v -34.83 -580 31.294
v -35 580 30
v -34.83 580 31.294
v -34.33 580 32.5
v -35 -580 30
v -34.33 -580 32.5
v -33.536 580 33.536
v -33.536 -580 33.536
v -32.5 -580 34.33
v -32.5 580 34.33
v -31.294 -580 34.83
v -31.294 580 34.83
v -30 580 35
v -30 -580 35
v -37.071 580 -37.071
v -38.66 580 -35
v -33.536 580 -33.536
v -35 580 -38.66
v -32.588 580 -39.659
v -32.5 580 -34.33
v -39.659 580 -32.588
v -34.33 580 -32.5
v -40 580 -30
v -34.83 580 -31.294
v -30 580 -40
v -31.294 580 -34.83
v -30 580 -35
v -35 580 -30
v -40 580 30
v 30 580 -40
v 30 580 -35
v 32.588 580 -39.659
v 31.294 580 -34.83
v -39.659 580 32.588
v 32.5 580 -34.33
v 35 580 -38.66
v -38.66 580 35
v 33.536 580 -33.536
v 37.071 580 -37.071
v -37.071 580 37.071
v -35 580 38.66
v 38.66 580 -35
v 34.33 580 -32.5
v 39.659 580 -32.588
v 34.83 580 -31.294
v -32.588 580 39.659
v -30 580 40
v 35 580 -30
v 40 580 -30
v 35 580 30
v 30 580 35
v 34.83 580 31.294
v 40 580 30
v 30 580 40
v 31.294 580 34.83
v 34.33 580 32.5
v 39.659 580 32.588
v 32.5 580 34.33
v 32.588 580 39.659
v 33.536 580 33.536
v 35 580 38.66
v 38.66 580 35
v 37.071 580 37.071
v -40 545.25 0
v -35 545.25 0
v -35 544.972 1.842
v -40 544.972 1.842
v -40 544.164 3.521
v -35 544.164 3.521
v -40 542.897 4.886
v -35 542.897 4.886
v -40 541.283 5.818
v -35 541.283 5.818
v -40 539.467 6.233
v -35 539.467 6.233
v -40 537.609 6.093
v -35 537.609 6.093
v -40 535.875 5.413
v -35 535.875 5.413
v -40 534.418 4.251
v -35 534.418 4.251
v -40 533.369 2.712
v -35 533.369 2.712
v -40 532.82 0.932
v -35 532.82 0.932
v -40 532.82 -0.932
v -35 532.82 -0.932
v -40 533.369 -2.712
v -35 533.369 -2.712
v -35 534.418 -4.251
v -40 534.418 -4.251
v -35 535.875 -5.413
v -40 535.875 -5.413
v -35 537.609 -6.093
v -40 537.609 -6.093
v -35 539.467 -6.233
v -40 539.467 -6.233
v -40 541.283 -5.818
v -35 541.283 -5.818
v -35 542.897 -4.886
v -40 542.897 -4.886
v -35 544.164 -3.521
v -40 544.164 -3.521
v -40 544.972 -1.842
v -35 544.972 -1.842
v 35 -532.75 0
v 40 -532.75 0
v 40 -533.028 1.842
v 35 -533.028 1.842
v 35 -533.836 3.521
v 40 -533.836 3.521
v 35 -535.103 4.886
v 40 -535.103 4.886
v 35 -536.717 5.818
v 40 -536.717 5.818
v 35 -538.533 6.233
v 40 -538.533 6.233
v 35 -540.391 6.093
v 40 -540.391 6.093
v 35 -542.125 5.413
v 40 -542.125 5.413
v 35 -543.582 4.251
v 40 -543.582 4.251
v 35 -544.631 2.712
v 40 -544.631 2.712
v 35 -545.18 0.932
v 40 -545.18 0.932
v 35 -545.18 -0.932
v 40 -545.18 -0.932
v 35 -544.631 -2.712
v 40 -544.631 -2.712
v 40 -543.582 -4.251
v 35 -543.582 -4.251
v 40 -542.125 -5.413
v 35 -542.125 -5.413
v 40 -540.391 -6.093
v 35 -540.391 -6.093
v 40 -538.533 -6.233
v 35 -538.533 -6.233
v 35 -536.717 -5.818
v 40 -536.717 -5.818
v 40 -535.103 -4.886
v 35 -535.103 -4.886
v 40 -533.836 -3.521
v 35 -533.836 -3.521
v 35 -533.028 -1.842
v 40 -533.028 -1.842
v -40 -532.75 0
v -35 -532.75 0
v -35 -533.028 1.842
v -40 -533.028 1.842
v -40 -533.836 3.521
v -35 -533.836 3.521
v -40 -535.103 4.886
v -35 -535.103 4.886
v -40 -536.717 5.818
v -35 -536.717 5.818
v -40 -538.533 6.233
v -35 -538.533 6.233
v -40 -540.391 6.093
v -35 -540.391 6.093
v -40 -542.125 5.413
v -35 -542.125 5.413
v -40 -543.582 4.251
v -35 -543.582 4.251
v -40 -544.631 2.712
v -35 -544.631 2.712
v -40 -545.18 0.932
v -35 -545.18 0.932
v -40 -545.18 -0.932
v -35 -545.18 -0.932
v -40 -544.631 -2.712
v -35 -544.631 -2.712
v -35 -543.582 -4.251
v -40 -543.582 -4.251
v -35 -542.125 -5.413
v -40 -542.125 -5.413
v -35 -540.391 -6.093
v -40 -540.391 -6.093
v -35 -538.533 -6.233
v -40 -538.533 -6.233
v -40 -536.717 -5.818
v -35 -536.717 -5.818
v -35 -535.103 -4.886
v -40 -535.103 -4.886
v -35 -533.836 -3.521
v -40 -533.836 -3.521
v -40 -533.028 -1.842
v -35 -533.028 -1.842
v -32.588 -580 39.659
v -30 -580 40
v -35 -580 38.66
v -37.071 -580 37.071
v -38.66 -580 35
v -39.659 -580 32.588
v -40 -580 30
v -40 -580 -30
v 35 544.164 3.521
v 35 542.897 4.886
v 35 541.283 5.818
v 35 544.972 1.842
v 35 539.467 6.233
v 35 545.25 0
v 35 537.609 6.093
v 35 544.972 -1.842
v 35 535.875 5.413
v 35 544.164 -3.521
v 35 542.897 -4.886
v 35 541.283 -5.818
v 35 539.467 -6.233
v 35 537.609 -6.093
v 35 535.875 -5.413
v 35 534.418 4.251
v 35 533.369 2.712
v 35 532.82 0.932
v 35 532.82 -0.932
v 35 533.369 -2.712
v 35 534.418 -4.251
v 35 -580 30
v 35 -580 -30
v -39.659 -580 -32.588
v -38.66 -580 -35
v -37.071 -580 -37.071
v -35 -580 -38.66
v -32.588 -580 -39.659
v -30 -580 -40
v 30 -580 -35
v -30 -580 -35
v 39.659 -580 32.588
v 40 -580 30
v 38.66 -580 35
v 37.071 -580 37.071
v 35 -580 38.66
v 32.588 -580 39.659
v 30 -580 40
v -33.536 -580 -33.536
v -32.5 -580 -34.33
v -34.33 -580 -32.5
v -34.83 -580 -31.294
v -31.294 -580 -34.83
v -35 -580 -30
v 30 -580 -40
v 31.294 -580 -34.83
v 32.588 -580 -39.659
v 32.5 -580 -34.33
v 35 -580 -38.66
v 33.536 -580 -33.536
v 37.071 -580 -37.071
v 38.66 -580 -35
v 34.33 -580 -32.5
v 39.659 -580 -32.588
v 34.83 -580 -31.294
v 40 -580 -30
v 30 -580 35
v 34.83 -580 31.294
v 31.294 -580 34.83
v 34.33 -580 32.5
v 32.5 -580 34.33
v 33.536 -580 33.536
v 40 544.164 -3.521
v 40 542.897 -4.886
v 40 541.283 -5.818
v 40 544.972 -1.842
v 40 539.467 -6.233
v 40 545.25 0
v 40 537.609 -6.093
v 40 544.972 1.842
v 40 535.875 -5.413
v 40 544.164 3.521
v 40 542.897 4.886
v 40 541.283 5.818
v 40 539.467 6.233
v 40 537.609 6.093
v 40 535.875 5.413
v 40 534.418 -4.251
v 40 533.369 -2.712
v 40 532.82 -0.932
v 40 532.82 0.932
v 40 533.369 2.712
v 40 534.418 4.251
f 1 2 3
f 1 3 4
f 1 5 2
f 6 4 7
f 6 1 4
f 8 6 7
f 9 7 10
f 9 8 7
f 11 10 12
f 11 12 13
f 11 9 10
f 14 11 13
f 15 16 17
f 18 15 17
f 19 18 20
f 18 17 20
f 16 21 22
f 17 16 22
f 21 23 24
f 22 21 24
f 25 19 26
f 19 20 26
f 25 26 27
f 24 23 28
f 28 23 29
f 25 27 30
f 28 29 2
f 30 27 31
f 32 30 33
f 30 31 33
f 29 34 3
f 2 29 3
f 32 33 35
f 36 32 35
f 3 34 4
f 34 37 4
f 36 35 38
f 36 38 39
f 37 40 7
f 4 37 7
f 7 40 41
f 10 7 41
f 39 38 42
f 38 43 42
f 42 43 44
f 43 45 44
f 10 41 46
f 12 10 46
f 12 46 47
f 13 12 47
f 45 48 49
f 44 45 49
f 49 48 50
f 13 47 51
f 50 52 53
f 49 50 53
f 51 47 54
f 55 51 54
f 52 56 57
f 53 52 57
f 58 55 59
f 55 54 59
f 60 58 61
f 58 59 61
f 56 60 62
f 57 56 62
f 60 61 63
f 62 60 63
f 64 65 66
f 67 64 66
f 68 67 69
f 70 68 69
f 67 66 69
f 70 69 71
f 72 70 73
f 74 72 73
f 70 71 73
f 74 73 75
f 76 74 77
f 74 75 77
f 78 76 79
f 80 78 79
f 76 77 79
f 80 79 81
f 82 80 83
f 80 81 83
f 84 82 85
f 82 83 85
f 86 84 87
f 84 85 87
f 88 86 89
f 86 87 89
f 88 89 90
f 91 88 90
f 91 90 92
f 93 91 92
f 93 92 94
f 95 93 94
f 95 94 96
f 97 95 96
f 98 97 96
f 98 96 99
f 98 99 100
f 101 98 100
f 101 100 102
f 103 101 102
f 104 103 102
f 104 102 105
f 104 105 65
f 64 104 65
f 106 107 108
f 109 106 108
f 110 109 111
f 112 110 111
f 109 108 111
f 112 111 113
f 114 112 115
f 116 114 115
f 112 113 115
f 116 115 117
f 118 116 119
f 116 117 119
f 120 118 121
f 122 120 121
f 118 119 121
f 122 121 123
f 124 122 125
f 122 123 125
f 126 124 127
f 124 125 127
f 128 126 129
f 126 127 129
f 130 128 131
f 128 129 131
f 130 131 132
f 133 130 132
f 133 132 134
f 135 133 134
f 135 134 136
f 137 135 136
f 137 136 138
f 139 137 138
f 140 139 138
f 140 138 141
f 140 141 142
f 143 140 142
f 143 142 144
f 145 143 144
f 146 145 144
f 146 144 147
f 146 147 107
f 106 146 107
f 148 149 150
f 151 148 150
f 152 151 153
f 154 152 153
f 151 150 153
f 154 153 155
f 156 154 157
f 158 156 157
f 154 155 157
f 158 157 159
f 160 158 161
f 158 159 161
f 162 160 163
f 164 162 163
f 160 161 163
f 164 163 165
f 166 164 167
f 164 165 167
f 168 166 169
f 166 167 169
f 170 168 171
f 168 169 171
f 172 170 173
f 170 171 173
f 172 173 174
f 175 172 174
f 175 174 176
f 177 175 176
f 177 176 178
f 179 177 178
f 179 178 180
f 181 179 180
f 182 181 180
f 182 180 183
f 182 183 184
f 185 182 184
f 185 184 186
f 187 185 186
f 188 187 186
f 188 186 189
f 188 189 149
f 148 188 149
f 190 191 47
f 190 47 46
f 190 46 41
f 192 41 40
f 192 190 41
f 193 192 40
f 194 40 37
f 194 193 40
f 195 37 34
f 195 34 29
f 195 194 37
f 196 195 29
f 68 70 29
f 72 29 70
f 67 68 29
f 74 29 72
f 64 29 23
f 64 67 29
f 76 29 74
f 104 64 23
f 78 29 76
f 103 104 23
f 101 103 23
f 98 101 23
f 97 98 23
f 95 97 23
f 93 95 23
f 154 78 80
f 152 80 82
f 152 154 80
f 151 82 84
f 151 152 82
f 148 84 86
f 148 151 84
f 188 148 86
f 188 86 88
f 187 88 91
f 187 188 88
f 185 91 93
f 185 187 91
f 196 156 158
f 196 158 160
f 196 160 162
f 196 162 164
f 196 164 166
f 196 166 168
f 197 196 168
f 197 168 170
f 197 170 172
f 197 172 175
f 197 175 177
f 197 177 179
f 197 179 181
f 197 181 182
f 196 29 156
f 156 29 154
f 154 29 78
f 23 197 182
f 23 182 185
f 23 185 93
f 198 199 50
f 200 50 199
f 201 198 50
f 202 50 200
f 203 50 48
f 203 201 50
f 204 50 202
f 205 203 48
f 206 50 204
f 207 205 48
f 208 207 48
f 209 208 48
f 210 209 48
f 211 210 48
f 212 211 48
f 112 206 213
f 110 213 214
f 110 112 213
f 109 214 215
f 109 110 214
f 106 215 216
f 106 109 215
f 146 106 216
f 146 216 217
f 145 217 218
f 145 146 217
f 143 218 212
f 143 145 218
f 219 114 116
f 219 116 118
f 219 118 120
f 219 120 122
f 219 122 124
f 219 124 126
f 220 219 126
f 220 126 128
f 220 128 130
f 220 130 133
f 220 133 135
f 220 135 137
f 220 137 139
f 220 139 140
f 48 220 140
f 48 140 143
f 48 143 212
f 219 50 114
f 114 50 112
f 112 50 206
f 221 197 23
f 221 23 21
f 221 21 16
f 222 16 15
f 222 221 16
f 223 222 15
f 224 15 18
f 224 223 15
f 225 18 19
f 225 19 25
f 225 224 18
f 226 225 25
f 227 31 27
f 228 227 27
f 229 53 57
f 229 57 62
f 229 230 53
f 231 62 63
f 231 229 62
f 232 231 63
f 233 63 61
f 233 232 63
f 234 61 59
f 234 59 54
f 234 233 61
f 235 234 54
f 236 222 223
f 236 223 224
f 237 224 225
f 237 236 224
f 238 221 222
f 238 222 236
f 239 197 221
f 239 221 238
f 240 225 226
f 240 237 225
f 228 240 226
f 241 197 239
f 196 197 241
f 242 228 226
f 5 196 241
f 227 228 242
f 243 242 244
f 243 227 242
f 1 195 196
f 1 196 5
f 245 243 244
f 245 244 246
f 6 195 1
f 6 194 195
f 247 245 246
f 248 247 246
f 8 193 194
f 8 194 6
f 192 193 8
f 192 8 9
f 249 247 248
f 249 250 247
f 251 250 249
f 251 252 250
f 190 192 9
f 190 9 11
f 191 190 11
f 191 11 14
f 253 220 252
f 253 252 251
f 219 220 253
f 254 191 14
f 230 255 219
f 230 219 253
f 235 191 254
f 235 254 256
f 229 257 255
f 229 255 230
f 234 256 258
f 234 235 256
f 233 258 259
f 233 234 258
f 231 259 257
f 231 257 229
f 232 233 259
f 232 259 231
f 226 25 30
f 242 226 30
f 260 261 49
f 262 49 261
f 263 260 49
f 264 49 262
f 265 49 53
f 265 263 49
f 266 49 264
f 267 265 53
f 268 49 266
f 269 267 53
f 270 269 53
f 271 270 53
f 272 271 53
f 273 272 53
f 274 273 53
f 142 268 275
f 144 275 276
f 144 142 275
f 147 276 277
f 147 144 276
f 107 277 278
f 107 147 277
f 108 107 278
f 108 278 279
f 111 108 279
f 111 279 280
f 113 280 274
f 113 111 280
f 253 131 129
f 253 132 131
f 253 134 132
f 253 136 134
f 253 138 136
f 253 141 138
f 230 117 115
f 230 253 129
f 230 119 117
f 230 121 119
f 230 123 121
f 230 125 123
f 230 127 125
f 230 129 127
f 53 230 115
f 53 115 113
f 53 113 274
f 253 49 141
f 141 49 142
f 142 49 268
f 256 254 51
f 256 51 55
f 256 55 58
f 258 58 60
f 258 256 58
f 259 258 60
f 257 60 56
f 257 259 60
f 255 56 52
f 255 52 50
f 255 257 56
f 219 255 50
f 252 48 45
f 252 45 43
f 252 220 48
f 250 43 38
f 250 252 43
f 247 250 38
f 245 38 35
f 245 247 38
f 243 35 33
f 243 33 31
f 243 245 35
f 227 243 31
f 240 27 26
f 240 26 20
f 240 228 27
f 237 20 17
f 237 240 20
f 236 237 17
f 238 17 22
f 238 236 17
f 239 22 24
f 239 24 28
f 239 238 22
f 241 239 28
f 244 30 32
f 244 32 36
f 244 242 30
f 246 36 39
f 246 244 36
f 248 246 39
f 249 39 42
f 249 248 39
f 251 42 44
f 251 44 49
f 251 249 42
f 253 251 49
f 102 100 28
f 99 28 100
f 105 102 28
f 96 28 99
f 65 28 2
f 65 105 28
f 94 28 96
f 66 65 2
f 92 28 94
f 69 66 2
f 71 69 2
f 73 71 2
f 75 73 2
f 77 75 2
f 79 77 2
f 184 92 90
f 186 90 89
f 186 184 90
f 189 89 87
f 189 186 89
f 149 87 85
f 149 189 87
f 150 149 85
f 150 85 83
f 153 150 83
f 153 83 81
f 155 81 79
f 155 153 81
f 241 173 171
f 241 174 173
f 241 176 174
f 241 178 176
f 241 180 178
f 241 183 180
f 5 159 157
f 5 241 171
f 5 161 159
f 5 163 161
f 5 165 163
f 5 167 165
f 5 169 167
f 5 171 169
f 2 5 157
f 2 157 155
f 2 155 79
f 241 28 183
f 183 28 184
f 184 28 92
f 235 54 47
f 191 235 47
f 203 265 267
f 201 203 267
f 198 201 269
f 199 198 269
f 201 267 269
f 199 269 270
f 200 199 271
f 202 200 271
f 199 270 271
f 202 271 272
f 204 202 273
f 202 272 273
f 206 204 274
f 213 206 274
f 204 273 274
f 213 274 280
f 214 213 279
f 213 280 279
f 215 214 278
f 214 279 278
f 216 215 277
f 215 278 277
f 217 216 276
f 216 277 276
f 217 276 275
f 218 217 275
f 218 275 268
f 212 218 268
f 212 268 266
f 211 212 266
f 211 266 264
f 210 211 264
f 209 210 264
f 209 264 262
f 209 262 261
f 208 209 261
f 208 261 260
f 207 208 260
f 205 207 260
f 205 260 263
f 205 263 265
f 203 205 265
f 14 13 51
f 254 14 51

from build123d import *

# Parameters (mm, degrees)
F1_DEPTH = 580
F2_R     = 6.25
F3_DEPTH = 80.001


with BuildPart() as f1:
    # F0 (on Front) → F1 (new body, symmetric)
    with BuildSketch(Plane.XZ):
        with BuildLine():
            ThreePointArc((40, 30), (37.071068, 37.071068), (30, 40))
            Line((30, 40), (-30, 40))
            ThreePointArc((-30, 40), (-37.071068, 37.071068), (-40, 30))
            Line((-40, 30), (-40, -30))
            ThreePointArc((-40, -30), (-37.071068, -37.071068), (-30, -40))
            Line((-30, -40), (30, -40))
            ThreePointArc((30, -40), (37.071068, -37.071068), (40, -30))
            Line((40, -30), (40, 30))
        make_face()
        with BuildLine():
            ThreePointArc((30, 35), (33.535534, 33.535534), (35, 30))
            Line((35, 30), (35, -30))
            ThreePointArc((35, -30), (33.535534, -33.535534), (30, -35))
            Line((30, -35), (-30, -35))
            ThreePointArc((-30, -35), (-33.535534, -33.535534), (-35, -30))
            Line((-35, -30), (-35, 30))
            ThreePointArc((-35, 30), (-33.535534, 33.535534), (-30, 35))
            Line((-30, 35), (30, 35))
        make_face(mode=Mode.SUBTRACT)
    extrude(amount=F1_DEPTH, both=True)

    # F2 (on face) → F3 (cut, through all)
    with BuildSketch(Plane.YZ.offset(40)):
        with Locations((-539, 0)):
            Circle(F2_R)
        with Locations((539, 0)):
            Circle(F2_R)
    extrude(amount=-F3_DEPTH, mode=Mode.SUBTRACT)


solid = f1.part
